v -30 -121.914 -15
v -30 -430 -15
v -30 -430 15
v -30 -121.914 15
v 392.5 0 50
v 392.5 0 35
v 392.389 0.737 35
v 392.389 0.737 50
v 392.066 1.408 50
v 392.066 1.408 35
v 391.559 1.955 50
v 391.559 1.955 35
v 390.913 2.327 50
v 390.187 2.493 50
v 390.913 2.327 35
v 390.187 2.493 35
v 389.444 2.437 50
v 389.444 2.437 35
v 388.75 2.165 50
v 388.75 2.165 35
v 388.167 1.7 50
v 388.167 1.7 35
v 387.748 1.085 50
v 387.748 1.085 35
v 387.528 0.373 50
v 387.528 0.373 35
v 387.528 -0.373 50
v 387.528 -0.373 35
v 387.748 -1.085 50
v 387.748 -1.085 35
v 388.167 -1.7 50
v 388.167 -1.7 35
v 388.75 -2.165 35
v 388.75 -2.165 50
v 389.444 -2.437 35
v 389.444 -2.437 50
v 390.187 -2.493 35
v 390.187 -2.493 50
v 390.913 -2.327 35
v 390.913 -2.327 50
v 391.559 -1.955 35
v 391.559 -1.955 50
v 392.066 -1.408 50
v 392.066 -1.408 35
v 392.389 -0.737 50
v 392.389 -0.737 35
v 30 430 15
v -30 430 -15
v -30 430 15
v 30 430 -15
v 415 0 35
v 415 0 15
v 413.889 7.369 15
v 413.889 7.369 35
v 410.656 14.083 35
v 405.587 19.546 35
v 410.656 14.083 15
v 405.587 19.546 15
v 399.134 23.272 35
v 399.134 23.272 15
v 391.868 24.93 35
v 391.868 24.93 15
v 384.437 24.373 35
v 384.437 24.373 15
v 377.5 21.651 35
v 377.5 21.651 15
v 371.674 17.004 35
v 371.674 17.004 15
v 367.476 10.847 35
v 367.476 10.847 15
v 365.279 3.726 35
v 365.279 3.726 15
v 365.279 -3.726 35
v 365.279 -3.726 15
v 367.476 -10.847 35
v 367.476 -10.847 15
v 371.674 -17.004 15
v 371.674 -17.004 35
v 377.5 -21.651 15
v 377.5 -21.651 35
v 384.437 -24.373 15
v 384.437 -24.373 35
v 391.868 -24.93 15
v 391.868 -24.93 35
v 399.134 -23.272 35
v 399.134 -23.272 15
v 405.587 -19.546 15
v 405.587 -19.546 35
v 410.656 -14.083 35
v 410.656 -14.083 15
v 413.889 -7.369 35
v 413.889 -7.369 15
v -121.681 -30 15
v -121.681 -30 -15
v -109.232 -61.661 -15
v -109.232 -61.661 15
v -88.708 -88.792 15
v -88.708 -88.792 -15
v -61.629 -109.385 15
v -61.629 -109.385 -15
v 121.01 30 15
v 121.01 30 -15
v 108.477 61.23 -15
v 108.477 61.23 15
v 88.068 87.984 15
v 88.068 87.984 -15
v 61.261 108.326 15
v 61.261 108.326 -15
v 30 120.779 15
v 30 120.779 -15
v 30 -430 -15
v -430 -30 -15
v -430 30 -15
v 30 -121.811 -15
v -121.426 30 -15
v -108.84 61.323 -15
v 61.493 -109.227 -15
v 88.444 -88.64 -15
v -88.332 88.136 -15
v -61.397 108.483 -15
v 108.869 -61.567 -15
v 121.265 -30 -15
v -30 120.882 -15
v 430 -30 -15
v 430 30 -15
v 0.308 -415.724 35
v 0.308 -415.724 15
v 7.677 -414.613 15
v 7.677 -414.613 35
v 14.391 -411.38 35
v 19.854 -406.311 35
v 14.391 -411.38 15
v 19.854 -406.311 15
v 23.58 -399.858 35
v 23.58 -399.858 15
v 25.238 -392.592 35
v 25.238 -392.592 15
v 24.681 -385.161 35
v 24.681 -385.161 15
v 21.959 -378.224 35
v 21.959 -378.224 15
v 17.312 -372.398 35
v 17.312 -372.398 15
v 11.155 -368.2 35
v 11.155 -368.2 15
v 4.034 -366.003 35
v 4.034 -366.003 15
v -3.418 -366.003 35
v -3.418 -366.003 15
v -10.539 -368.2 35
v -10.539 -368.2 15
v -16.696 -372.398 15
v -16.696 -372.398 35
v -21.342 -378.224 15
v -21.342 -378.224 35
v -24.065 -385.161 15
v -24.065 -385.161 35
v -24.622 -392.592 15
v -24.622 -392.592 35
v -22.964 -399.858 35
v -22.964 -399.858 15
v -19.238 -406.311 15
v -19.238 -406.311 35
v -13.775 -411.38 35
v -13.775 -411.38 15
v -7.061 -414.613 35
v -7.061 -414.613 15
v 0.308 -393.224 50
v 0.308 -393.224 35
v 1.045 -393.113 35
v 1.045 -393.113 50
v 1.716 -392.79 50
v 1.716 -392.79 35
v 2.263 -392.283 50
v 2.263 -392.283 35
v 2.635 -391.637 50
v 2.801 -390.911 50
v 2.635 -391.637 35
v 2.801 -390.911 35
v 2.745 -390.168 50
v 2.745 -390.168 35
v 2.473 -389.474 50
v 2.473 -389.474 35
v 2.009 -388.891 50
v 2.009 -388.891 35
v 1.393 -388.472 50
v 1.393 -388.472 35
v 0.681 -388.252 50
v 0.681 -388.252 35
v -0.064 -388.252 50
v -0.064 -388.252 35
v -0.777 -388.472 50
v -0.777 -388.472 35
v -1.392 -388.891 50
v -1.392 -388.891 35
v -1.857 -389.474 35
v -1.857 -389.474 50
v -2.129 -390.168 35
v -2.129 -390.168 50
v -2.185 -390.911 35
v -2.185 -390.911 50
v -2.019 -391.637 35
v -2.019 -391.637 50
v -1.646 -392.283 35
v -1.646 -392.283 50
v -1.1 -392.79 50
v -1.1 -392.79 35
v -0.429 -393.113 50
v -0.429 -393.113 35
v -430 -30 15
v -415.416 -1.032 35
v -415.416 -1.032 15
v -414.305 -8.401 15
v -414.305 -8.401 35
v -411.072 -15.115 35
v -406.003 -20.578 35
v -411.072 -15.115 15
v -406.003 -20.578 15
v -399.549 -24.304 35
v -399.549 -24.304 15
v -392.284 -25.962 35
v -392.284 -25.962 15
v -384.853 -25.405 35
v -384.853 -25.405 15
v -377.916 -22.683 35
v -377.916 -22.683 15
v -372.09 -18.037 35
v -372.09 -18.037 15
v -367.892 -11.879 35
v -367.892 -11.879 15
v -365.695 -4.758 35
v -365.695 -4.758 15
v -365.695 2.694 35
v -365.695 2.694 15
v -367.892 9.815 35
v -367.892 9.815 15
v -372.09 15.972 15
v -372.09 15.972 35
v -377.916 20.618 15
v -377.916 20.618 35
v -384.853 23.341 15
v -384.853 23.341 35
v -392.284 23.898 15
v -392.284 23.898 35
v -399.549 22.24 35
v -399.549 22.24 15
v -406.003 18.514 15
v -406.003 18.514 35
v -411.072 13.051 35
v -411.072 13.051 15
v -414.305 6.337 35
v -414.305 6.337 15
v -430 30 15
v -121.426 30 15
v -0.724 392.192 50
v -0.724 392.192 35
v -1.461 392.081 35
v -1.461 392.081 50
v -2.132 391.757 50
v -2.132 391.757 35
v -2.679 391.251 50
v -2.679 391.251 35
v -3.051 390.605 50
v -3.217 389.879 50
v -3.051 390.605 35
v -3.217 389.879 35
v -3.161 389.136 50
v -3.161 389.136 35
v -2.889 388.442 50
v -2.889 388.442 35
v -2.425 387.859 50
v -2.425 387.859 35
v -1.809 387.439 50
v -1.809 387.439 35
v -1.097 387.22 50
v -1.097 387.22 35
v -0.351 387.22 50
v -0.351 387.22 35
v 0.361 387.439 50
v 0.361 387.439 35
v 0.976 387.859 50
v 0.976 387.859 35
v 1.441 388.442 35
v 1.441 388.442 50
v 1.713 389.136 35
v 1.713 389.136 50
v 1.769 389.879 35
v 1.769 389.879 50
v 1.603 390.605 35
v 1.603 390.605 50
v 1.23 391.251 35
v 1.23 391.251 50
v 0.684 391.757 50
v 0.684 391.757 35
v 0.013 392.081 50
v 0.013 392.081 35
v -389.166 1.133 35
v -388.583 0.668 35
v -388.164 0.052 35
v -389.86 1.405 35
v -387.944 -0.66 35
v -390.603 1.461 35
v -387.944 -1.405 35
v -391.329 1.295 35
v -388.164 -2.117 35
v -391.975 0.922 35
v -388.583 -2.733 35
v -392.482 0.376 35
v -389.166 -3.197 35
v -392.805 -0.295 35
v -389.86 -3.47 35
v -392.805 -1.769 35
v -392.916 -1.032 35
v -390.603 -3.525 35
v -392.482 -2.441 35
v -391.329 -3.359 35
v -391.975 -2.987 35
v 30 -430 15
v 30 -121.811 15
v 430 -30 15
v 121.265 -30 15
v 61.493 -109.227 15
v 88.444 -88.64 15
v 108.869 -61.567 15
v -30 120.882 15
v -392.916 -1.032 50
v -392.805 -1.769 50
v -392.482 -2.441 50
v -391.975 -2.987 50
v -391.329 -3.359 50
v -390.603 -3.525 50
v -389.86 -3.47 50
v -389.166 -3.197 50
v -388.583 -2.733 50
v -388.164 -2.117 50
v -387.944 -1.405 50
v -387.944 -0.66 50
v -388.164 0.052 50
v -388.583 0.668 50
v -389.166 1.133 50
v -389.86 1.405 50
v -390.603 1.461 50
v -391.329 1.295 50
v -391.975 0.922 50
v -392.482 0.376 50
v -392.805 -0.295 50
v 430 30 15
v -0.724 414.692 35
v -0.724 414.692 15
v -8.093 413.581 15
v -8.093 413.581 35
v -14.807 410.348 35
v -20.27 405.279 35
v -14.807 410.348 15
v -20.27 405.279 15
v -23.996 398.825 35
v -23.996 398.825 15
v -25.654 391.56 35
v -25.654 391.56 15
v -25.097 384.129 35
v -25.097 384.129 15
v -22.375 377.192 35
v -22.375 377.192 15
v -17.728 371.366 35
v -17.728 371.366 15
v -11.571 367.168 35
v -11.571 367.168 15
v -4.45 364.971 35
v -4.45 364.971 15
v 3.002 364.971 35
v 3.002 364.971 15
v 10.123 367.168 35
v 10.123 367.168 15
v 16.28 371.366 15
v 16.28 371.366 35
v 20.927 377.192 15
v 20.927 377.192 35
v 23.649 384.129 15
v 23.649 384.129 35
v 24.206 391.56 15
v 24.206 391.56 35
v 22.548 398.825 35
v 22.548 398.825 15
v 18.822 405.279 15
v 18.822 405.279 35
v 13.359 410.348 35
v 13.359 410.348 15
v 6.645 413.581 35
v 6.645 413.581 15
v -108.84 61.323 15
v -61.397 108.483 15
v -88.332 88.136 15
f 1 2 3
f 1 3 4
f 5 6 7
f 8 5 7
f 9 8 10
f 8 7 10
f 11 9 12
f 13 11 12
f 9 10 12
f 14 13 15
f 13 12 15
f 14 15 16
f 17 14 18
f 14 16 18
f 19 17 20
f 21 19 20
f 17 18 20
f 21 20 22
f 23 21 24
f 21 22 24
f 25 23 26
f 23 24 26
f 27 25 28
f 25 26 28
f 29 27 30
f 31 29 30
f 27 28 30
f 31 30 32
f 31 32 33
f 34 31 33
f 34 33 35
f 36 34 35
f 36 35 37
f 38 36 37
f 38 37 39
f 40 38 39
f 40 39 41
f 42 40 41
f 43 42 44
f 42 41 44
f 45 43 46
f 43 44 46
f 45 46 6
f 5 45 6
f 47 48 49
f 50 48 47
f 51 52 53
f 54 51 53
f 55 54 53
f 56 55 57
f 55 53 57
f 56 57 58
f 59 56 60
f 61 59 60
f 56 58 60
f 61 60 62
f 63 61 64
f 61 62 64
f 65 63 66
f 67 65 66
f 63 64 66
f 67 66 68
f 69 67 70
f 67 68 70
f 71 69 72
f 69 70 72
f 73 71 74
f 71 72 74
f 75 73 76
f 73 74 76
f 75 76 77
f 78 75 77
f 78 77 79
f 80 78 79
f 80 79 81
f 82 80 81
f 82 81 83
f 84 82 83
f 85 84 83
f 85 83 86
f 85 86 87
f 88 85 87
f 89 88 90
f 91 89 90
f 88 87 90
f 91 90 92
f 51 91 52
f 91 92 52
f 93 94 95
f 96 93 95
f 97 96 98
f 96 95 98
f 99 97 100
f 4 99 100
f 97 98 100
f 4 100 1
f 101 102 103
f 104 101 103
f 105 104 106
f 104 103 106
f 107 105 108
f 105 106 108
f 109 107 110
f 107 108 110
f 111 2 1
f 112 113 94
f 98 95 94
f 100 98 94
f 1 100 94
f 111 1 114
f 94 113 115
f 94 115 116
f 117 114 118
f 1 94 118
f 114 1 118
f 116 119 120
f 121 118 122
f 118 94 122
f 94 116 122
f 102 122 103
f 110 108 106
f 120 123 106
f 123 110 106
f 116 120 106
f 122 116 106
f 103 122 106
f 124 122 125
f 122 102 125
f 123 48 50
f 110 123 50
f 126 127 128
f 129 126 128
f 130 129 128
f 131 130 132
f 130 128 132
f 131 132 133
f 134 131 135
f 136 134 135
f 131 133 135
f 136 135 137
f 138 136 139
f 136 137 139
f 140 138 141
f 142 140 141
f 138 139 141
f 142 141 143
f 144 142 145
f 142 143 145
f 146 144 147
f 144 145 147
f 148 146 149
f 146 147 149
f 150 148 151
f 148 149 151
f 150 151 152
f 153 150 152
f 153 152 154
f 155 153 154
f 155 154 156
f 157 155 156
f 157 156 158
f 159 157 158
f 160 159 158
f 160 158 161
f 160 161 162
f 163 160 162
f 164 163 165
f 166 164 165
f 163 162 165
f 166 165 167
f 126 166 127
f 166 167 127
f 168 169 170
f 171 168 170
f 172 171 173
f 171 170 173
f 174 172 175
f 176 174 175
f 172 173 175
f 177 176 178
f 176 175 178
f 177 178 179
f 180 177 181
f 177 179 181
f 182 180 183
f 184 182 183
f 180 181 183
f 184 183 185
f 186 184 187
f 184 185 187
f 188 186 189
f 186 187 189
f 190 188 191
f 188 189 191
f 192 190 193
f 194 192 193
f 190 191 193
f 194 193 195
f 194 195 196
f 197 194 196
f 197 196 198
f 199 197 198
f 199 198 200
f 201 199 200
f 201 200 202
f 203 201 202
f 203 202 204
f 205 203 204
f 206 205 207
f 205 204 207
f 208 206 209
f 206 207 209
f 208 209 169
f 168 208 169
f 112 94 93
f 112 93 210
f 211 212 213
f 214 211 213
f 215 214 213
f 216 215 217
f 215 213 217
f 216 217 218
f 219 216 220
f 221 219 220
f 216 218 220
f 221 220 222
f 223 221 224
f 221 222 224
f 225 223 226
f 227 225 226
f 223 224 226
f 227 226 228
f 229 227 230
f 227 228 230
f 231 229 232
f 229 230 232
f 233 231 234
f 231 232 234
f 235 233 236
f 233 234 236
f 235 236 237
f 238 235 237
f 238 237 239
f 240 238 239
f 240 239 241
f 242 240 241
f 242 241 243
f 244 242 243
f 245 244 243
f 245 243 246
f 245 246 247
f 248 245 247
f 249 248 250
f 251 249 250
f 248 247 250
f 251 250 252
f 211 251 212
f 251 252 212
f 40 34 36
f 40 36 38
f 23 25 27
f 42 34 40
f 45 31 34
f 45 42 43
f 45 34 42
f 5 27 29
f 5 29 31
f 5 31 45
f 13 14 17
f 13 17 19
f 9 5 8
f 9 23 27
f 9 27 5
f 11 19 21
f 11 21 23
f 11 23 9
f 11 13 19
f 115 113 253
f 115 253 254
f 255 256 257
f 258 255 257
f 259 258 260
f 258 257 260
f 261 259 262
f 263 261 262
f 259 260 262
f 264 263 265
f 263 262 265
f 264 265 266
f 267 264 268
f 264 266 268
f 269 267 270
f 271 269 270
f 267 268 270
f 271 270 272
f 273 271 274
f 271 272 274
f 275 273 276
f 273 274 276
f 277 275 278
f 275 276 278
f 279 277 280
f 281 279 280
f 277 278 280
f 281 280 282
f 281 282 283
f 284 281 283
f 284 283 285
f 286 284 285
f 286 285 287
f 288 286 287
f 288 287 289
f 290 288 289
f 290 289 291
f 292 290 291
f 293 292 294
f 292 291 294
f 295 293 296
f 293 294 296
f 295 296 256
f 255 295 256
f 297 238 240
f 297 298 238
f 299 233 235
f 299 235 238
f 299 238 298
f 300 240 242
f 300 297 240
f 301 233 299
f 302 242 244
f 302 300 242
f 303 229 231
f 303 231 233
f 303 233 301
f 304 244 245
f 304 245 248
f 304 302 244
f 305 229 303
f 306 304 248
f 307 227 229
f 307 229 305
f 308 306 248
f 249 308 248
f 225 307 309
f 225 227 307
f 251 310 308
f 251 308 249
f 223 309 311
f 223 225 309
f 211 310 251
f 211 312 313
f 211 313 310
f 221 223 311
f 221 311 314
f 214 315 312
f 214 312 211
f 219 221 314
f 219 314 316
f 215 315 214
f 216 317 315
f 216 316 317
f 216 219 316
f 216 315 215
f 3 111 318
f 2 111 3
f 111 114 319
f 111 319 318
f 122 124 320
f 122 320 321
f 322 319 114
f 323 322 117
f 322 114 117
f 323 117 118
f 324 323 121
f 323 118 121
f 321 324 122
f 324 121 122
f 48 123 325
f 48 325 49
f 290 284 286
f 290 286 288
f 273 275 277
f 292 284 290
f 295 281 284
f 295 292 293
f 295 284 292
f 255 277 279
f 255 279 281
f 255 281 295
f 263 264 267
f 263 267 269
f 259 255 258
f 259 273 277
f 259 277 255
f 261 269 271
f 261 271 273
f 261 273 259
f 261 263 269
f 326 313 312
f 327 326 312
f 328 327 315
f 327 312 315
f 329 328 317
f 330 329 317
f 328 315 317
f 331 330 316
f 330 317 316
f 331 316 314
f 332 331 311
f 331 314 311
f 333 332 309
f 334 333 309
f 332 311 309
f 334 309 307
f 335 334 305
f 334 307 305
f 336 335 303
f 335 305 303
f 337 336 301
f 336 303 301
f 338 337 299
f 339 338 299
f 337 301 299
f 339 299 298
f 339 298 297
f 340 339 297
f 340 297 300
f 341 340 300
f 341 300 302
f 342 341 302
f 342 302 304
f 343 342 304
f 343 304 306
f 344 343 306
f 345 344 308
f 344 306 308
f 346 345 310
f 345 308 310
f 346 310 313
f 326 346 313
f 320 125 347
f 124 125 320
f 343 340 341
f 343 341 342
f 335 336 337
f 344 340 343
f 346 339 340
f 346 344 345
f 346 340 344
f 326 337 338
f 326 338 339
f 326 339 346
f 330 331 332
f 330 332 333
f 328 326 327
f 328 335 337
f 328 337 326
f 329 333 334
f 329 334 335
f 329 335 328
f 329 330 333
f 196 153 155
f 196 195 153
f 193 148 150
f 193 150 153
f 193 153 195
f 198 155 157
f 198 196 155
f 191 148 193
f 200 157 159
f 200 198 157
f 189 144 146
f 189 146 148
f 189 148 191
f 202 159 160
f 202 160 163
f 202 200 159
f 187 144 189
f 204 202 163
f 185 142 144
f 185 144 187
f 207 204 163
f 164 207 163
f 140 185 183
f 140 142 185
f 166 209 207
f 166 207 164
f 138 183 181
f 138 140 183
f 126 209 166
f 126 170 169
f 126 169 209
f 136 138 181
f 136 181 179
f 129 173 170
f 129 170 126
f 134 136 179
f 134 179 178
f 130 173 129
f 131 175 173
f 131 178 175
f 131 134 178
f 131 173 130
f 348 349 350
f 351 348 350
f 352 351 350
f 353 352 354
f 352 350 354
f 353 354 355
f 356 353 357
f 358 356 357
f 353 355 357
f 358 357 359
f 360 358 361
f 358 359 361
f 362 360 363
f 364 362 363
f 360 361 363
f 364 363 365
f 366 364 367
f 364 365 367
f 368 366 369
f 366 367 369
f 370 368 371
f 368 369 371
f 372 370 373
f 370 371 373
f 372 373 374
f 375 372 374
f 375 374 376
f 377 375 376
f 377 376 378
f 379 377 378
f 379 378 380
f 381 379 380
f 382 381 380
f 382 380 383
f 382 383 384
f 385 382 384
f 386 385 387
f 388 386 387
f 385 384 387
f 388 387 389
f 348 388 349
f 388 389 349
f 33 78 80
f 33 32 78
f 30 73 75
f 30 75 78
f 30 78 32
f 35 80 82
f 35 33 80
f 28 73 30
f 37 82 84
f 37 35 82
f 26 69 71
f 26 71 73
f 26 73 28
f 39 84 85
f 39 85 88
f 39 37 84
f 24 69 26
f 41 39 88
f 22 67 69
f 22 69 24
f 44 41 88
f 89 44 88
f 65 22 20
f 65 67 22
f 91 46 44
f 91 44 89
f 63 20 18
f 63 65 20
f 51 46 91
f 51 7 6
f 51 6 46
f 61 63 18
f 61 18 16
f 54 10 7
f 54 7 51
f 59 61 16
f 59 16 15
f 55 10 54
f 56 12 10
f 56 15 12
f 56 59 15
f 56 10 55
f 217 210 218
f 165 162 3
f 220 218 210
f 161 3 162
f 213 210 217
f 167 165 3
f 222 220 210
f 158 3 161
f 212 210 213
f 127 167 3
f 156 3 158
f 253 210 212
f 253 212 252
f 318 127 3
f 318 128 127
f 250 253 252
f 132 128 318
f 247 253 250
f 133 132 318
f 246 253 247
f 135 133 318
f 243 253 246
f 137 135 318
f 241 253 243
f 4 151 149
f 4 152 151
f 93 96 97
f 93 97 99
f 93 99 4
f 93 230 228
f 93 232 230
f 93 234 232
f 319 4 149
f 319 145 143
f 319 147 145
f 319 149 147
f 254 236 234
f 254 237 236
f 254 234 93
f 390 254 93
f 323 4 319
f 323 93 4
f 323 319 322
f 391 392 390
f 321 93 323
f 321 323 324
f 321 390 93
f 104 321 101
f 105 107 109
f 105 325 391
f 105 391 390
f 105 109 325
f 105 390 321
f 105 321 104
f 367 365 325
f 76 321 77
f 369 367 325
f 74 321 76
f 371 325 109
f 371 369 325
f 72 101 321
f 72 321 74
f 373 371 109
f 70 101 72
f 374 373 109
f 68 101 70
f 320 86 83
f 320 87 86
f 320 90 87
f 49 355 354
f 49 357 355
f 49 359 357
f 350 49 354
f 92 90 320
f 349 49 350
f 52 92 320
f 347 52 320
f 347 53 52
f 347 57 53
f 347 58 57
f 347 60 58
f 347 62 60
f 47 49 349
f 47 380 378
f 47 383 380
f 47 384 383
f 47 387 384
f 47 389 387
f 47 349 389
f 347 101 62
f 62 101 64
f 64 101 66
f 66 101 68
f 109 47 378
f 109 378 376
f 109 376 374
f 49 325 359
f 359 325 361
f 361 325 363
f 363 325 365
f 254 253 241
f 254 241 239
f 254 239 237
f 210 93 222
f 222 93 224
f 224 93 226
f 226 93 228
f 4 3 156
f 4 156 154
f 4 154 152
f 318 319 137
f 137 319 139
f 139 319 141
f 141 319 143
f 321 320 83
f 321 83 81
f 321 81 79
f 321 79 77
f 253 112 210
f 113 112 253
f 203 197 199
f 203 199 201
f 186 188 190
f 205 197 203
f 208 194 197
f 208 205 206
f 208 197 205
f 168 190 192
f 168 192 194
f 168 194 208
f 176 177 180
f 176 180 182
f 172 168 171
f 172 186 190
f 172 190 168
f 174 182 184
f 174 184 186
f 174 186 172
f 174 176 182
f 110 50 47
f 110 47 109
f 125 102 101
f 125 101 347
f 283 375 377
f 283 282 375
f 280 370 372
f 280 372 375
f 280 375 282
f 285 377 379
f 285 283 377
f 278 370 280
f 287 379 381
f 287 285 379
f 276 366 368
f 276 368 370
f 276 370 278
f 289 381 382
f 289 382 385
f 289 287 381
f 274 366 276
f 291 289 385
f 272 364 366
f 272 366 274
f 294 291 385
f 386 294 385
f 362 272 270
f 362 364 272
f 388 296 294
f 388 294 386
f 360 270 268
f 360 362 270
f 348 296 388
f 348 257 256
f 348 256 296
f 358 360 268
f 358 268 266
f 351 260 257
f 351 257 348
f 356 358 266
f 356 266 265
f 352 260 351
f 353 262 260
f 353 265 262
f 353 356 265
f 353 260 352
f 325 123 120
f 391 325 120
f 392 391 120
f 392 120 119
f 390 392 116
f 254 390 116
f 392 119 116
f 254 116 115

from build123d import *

# Parameters (mm, degrees)
BOSS_EXTRUDE1_DEPTH      = 15
BOSS_EXTRUDE1_DEPTH_BACK = 15
SKETCH2_R                = 25
BOSS_EXTRUDE2_DEPTH      = 20
SKETCH3_R                = 2.5
BOSS_EXTRUDE3_DEPTH      = 15
CIRPATTERN1_COUNT        = 4


with BuildPart() as part:
    # Sketch1 → Boss-Extrude1 (new, two sides: drawn at the far end of the back side and taken through both)
    with BuildSketch(Plane.XY.offset(-BOSS_EXTRUDE1_DEPTH_BACK)):
        with BuildLine():
            Line((30, 430), (-30, 430))
            Line((-30, 430), (-30, 120.881719036))
            ThreePointArc((-30, 120.881719036), (-88.332125518, 88.135628612), (-121.425810587, 30))
            Line((-121.425810587, 30), (-430, 30))
            Line((-430, 30), (-430, -30))
            Line((-430, -30), (-121.68100765, -30))
            ThreePointArc((-121.68100765, -30), (-88.7083861, -88.792246397), (-30, -121.91395242))
            Line((-30, -121.91395242), (-30, -430))
            Line((-30, -430), (30, -430))
            Line((30, -430), (30, -121.811124765))
            ThreePointArc((30, -121.811124765), (88.443617434, -88.640445466), (121.26508205, -30))
            Line((121.26508205, -30), (430, -30))
            Line((430, -30), (430, 30))
            Line((430, 30), (121.009884987, 30))
            ThreePointArc((121.009884987, 30), (88.068001132, 87.984471961), (30, 120.778891382))
            Line((30, 120.778891382), (30, 430))
        make_face()
    extrude(amount=BOSS_EXTRUDE1_DEPTH + BOSS_EXTRUDE1_DEPTH_BACK)

    # Sketch2 → Boss-Extrude2 (add)
    with BuildSketch(Plane.XY.offset(15)):
        with Locations((390, 0)):
            Circle(SKETCH2_R)
    boss_extrude2 = extrude(amount=BOSS_EXTRUDE2_DEPTH)

    # Sketch3 → Boss-Extrude3 (add)
    with BuildSketch(Plane.XY.offset(35)):
        with Locations((390, 0)):
            Circle(SKETCH3_R)
    boss_extrude3 = extrude(amount=BOSS_EXTRUDE3_DEPTH)

    # CirPattern1: Boss-Extrude2, Boss-Extrude3 ×4 about axis
    cirpattern1_axis = Axis((-0.2079628, -0.516116692, -15), (0, 0, 1))
    add([boss_extrude2.rotate(cirpattern1_axis, i * 360 / CIRPATTERN1_COUNT) for i in range(1, CIRPATTERN1_COUNT)])
    add([boss_extrude3.rotate(cirpattern1_axis, i * 360 / CIRPATTERN1_COUNT) for i in range(1, CIRPATTERN1_COUNT)])


solid = part.part
